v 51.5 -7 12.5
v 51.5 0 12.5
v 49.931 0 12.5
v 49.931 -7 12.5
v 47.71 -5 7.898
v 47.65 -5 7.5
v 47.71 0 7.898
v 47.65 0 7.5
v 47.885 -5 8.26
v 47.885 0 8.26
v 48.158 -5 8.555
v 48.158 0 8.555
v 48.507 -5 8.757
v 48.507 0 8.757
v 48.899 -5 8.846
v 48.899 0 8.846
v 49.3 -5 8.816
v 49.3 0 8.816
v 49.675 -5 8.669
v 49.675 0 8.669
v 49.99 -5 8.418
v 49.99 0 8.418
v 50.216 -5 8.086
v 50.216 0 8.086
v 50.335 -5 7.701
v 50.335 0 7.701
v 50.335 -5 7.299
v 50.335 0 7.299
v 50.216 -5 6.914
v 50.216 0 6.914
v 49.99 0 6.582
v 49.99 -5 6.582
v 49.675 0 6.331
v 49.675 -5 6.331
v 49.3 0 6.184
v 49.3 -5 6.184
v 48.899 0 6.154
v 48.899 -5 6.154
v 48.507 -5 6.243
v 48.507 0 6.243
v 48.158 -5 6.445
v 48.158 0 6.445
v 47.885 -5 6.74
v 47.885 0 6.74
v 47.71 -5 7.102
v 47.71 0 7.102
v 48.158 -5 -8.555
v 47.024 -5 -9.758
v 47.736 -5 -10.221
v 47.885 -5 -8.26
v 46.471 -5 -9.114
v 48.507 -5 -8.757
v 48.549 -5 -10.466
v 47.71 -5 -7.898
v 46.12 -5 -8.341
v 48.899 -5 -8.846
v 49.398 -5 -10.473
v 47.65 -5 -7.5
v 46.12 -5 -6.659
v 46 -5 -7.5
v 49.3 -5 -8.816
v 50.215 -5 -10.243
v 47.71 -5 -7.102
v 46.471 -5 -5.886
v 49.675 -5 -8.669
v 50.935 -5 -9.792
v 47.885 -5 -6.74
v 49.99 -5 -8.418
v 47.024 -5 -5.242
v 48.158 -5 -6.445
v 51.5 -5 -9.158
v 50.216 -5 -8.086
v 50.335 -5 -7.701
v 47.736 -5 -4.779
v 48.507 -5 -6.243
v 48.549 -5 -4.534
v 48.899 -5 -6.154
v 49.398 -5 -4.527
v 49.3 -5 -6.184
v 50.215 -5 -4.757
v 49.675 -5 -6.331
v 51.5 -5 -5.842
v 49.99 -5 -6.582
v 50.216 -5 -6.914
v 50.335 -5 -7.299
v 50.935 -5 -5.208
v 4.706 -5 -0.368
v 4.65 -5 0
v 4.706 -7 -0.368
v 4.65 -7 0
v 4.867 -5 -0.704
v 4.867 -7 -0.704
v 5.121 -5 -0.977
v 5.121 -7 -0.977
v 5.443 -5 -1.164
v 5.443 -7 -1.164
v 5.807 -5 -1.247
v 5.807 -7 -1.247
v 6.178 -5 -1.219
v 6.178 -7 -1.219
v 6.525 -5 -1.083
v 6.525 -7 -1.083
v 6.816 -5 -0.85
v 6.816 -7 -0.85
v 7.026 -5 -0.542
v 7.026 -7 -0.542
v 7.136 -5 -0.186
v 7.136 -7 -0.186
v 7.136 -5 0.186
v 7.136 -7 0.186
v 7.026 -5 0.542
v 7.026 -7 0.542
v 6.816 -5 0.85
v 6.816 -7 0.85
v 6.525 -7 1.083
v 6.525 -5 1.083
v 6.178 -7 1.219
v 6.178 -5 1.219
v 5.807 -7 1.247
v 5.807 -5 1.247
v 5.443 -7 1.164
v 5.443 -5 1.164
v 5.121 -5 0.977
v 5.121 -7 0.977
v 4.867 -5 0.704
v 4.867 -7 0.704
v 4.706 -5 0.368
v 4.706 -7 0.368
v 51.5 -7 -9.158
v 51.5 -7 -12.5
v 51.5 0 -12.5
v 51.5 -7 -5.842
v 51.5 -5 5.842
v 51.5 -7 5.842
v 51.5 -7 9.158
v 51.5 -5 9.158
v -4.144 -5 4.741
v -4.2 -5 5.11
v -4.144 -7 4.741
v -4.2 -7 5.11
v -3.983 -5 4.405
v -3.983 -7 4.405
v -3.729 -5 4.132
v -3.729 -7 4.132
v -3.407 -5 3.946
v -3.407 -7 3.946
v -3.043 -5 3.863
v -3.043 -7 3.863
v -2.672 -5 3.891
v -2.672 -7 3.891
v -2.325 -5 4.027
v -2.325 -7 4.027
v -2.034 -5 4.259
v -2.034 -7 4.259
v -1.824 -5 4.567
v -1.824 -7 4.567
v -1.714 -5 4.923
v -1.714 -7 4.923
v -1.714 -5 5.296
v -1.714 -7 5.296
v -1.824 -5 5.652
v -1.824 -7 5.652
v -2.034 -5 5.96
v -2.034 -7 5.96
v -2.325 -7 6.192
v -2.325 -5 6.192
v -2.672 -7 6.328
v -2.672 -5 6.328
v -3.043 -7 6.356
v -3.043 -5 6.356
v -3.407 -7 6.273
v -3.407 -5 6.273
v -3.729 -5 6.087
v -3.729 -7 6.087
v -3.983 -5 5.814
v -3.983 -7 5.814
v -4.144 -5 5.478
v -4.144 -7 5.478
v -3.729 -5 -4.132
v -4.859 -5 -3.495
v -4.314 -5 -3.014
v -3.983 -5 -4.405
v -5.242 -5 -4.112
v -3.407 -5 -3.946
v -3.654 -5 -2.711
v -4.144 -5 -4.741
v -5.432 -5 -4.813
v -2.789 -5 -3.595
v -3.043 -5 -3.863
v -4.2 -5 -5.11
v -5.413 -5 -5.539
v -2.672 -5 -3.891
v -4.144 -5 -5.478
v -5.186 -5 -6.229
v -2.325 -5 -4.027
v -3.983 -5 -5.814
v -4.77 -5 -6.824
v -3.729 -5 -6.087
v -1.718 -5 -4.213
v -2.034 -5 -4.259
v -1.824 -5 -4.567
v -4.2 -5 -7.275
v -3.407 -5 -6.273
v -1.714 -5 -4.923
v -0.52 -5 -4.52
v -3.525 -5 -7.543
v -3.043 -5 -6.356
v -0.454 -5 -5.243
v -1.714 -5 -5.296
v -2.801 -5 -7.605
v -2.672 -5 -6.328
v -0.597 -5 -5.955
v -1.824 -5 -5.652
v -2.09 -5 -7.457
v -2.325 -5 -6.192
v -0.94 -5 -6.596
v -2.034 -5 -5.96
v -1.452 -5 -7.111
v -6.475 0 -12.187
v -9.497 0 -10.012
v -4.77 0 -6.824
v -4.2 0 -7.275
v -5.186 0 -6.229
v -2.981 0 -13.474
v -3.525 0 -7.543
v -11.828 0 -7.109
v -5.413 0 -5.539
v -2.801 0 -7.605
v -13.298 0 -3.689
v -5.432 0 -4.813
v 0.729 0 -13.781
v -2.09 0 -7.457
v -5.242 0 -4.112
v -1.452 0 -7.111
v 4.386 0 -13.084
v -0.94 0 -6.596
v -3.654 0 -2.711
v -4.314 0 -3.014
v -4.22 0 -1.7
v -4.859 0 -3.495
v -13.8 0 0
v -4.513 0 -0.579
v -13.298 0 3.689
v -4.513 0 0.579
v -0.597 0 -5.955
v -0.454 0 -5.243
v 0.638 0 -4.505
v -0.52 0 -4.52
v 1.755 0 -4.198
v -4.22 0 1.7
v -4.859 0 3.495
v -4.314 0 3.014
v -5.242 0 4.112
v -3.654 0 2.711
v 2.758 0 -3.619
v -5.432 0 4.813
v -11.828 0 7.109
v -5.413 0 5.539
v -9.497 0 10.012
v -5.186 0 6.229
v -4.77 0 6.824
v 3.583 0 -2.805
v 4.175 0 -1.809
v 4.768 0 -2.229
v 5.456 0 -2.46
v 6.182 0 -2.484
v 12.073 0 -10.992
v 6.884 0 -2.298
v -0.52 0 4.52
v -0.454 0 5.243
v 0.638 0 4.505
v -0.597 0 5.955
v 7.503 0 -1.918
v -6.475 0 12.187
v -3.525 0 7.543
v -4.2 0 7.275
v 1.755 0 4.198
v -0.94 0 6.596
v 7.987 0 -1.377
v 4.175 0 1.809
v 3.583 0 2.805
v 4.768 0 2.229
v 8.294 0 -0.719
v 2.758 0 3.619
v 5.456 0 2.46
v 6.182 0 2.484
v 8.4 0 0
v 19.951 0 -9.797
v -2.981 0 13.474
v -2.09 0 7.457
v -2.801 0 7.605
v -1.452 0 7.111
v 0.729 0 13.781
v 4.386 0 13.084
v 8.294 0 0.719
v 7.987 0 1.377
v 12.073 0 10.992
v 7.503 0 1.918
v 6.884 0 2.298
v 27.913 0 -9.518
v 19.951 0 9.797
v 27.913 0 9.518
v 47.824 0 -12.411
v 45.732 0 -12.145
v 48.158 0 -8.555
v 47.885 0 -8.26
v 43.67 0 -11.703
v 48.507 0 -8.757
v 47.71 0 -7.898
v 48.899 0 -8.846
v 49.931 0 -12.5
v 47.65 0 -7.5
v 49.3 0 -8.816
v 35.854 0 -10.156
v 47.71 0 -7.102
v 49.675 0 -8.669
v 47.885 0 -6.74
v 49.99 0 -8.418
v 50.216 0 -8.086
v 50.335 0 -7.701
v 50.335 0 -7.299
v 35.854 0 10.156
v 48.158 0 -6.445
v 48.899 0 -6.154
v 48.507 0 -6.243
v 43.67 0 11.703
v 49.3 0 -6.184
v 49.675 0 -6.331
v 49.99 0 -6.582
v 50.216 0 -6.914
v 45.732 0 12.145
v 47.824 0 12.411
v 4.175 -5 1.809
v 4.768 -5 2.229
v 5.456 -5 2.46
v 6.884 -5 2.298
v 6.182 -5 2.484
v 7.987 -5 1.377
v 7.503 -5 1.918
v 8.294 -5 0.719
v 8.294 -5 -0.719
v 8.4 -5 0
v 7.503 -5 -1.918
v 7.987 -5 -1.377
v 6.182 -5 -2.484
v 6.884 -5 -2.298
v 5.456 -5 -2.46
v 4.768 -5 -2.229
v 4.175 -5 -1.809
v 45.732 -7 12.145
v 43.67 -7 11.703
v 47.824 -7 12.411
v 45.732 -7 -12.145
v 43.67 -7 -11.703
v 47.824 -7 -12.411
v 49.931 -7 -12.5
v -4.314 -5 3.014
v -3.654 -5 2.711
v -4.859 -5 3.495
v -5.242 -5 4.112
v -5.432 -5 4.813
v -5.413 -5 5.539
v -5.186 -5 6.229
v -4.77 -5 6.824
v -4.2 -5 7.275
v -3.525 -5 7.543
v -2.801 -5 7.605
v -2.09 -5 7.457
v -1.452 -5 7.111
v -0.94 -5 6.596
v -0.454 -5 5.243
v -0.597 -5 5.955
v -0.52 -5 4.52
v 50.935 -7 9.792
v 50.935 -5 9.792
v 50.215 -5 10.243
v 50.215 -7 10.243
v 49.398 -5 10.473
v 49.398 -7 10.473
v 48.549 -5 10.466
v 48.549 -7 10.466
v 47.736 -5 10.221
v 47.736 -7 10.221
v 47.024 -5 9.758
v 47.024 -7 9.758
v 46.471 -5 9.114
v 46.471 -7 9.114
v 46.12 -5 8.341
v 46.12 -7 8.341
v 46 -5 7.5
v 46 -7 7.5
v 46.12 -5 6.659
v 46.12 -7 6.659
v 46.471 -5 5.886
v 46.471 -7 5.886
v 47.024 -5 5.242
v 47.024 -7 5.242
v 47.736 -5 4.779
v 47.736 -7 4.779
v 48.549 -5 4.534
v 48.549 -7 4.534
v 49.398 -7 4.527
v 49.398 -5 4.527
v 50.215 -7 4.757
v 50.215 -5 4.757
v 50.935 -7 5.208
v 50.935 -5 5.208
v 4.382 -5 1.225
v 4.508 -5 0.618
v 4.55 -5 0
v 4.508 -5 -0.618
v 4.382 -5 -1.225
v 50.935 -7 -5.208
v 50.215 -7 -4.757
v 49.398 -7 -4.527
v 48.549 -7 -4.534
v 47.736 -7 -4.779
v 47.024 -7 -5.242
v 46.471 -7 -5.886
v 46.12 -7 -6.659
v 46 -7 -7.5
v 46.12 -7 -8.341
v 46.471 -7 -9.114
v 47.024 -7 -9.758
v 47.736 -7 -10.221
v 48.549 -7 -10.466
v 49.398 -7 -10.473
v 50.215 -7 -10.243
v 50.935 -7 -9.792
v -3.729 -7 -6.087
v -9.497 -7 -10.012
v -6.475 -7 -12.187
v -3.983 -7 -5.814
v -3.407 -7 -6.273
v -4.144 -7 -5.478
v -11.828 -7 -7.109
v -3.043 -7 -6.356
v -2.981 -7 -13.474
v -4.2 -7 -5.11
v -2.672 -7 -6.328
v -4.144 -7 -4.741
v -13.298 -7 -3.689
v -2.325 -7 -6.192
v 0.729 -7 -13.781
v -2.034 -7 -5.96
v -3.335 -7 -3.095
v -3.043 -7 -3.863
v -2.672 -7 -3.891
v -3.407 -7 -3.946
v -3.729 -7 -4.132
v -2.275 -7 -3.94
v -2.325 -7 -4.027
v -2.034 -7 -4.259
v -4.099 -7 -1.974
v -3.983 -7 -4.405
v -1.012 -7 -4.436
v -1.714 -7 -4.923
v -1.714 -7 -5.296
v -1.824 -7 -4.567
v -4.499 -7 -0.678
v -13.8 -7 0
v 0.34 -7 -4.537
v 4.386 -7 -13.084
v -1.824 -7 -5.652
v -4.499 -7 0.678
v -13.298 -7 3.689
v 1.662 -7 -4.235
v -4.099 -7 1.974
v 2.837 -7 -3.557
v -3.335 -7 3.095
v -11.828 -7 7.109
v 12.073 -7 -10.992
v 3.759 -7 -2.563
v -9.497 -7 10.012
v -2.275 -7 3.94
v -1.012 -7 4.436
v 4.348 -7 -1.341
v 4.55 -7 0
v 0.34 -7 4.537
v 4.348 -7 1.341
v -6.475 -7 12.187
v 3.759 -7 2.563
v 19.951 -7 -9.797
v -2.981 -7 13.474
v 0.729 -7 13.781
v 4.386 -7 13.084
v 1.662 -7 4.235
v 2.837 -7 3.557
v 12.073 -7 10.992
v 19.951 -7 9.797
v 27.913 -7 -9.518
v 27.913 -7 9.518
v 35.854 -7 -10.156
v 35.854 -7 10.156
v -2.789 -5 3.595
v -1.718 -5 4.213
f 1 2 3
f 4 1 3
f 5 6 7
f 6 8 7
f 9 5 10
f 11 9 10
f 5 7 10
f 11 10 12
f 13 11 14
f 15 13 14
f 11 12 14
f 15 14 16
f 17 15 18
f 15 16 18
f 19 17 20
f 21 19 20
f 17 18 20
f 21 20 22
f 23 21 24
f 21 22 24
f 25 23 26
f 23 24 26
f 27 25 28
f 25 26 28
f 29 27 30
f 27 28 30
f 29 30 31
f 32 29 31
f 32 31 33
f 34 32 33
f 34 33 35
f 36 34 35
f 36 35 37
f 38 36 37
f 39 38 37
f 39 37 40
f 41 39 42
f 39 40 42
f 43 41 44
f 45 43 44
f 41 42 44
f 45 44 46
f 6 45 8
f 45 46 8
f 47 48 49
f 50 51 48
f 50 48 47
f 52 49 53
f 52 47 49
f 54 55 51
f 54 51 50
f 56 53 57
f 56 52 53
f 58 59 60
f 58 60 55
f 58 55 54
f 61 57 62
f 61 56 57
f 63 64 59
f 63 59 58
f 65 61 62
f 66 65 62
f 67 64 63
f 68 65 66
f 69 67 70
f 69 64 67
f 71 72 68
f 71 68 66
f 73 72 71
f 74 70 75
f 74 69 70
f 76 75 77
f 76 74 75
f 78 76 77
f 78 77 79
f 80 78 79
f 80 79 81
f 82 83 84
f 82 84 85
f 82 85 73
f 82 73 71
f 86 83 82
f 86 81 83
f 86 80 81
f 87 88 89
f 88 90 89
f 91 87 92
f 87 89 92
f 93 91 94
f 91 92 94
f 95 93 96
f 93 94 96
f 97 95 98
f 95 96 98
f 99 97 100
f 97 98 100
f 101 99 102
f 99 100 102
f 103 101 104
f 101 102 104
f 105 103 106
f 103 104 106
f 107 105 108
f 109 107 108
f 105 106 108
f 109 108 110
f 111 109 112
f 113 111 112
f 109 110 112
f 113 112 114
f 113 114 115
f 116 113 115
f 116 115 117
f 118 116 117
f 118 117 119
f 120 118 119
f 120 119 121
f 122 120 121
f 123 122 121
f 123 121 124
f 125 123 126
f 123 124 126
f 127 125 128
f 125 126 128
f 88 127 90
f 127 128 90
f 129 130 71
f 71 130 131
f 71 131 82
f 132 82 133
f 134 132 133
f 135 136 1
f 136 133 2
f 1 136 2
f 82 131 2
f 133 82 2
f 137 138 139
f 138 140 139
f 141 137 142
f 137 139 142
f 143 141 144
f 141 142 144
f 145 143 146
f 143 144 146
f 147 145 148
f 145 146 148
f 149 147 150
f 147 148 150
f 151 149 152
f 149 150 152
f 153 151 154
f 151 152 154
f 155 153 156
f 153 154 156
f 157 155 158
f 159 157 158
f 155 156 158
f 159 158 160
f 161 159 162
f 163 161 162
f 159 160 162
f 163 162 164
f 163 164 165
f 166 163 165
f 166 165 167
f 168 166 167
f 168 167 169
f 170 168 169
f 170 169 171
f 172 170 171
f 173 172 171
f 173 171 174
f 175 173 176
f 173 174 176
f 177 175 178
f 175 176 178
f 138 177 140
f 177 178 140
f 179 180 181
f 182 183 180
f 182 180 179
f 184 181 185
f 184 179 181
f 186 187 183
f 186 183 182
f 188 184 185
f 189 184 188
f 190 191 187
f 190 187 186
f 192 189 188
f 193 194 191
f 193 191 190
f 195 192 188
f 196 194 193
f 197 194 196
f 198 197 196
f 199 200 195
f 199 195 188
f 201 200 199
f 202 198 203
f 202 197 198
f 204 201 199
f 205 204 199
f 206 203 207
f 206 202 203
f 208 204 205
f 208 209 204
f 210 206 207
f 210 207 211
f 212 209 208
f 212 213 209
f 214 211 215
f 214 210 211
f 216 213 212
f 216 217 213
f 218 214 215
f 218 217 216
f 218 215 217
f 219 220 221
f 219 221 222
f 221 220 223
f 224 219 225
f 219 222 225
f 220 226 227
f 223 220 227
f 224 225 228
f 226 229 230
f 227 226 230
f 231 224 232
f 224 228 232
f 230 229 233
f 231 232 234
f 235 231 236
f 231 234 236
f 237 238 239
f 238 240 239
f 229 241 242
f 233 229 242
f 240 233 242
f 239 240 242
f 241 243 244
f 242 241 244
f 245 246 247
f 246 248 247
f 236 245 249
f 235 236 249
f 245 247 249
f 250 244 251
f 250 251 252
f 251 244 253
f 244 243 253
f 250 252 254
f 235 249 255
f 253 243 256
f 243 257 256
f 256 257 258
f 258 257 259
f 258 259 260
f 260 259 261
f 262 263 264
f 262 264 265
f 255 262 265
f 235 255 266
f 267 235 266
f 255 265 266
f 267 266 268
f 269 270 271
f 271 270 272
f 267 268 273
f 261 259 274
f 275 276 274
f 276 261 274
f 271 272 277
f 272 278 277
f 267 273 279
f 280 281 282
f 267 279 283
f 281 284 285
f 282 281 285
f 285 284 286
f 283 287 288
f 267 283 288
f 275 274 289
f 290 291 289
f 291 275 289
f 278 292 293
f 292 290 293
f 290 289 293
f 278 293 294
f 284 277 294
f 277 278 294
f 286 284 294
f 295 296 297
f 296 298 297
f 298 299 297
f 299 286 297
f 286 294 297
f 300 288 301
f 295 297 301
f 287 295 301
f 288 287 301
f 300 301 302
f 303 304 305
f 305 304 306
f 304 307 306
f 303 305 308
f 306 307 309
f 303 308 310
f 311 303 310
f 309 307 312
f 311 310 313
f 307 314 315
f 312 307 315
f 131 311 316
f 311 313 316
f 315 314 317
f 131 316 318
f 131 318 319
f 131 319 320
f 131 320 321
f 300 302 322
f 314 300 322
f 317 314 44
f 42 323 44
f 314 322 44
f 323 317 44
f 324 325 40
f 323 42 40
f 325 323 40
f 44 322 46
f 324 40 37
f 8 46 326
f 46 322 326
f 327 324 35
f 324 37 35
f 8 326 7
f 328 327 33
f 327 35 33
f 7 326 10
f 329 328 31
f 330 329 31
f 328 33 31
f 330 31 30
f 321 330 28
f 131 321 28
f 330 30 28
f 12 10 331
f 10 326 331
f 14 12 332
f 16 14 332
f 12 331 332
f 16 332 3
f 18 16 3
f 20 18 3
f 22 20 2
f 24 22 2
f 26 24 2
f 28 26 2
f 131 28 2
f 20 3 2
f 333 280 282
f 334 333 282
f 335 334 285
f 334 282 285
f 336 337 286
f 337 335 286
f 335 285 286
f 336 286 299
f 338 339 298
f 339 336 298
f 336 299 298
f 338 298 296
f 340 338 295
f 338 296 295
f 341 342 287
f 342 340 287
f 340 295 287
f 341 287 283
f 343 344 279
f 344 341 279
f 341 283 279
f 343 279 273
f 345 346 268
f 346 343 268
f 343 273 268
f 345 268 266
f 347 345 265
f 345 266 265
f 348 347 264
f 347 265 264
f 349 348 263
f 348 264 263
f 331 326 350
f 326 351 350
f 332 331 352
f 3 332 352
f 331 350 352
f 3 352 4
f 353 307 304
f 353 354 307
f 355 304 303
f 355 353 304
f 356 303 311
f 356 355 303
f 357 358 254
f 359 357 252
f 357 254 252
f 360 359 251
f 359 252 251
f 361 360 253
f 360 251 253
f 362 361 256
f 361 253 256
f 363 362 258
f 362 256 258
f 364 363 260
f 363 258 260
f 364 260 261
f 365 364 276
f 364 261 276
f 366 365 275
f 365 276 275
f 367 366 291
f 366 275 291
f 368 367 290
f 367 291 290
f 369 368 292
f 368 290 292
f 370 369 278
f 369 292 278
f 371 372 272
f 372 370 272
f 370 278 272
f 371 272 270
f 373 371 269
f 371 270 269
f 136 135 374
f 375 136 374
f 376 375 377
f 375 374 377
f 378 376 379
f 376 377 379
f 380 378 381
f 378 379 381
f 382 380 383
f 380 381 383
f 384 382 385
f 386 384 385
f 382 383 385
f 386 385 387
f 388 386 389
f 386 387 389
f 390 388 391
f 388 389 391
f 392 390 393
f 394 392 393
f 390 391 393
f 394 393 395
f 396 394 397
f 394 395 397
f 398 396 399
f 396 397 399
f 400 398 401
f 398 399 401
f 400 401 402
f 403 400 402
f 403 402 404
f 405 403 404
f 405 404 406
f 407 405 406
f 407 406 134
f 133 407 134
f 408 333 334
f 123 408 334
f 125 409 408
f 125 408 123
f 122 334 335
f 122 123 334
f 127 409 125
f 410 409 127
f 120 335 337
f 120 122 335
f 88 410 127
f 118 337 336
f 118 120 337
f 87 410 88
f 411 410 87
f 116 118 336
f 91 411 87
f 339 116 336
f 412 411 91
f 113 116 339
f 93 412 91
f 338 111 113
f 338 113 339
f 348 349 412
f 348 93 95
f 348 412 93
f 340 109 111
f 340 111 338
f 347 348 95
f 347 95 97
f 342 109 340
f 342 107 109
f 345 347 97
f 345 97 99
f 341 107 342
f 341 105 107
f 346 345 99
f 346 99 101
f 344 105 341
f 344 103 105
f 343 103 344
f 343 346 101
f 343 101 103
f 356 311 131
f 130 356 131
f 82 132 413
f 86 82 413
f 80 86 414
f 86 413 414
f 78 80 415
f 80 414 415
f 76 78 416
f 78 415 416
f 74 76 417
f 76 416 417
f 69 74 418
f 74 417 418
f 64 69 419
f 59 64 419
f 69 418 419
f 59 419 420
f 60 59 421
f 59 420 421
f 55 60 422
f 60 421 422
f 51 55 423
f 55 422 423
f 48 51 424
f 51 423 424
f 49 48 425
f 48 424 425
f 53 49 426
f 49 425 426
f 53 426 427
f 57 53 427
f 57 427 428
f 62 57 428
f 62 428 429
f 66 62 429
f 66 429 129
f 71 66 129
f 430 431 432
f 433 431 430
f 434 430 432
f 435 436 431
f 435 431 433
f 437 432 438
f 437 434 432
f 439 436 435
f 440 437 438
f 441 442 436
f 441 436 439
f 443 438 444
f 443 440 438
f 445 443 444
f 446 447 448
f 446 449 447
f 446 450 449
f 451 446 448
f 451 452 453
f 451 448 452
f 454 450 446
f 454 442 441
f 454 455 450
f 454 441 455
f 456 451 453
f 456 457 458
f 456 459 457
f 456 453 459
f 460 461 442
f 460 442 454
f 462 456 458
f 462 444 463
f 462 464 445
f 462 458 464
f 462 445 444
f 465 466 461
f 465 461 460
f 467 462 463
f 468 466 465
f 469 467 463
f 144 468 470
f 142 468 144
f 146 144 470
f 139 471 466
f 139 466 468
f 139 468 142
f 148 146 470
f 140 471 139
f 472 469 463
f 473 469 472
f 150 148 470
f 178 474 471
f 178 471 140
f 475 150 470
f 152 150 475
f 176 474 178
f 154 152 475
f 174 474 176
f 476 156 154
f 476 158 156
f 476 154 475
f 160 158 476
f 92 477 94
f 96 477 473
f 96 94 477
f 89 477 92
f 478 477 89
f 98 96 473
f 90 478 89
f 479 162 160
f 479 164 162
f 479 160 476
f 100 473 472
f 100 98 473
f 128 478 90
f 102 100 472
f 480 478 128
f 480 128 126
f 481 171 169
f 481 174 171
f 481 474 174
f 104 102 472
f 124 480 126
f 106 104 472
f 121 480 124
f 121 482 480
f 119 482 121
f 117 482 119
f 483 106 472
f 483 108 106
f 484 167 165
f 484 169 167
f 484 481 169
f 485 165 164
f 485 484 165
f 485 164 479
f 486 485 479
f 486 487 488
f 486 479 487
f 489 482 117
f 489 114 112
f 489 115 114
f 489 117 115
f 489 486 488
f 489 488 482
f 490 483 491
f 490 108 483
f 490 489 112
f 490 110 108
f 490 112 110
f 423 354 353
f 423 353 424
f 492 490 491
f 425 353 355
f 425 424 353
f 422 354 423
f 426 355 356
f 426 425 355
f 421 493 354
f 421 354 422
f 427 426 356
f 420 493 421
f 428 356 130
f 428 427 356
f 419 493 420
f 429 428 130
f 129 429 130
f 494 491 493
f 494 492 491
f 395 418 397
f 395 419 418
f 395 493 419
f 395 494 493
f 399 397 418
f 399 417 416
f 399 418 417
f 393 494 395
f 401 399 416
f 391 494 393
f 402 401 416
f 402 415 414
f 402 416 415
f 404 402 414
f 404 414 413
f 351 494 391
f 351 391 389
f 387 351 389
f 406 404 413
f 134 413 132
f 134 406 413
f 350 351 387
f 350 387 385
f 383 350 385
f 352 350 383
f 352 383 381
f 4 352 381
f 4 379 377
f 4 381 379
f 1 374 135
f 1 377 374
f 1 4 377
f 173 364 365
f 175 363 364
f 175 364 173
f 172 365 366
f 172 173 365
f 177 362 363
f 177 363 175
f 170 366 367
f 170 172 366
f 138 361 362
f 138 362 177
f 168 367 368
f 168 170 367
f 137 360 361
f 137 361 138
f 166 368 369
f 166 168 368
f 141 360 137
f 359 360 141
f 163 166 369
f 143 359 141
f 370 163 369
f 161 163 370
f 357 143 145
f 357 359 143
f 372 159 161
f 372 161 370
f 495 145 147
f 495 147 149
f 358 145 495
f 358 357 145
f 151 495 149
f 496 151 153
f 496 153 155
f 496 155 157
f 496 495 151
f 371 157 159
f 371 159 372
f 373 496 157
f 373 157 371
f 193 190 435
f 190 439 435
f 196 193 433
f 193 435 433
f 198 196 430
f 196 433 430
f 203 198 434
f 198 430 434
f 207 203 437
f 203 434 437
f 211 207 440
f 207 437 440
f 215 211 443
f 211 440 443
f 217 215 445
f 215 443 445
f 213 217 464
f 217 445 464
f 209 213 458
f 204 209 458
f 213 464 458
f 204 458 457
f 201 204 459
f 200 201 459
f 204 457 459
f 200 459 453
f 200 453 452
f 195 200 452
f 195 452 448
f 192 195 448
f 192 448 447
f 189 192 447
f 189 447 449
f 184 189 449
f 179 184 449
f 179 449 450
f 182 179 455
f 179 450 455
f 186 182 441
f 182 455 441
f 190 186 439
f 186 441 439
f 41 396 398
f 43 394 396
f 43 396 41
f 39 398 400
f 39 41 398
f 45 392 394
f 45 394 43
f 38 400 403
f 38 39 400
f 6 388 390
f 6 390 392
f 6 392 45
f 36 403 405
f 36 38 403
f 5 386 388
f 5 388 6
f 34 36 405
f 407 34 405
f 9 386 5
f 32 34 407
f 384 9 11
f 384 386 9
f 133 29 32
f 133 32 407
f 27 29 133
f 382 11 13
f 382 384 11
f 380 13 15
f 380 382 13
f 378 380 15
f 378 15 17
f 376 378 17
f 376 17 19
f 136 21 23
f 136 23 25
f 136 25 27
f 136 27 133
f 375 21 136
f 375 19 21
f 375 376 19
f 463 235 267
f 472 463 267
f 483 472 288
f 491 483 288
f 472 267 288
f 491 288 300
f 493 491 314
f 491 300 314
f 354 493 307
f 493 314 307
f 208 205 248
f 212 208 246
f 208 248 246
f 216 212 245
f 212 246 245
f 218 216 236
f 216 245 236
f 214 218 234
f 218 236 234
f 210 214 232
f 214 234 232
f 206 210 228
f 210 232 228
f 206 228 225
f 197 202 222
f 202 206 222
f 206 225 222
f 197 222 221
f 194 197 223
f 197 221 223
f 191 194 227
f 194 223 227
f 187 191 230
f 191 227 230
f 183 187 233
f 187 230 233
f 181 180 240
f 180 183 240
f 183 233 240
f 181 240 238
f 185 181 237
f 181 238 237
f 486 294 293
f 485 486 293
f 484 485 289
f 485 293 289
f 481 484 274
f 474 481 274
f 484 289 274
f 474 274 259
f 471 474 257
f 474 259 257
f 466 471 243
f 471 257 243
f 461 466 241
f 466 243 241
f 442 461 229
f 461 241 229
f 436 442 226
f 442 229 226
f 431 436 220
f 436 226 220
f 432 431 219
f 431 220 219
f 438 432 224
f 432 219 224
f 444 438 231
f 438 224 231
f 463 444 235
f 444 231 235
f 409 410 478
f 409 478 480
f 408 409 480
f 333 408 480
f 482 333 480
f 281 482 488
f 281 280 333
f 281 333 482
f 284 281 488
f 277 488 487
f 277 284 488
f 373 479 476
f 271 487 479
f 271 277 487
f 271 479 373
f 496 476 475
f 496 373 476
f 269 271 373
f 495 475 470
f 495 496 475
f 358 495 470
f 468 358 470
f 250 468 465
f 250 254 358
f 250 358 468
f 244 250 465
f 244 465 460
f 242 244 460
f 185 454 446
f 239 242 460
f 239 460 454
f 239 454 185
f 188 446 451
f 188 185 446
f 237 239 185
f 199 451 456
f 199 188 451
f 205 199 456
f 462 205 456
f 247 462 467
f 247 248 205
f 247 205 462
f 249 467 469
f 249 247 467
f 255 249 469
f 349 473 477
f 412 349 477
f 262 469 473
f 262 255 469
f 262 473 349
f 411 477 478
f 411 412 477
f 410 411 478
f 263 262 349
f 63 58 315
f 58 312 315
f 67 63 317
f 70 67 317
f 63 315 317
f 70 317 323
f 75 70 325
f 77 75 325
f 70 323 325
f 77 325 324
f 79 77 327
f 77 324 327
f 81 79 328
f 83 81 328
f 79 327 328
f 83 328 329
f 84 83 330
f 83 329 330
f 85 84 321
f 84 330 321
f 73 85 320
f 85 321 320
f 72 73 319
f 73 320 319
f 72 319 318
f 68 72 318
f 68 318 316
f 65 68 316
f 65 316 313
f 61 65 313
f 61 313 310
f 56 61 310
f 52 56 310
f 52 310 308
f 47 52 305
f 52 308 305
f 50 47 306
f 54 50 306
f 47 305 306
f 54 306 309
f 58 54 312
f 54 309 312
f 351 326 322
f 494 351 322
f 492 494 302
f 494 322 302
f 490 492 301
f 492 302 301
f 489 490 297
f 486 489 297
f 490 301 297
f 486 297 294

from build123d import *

# Parameters (mm, degrees)
F0_R           = 4.55
F1_DEPTH       = 7
F3_D           = 2.5
F3_CBORE_D     = 5
F3_CBORE_DEPTH = 5
F4_D           = 2.7
F4_CBORE_D     = 6
F4_CBORE_DEPTH = 2
F5_R           = 25


with BuildPart() as f1:
    # F0 (on Front) → F1 (new body)
    with BuildSketch(Plane.XZ):
        with BuildLine():
            ThreePointArc((4.3861063064, -13.0844209451), (11.2019700729, -8.0595202392), (13.8, 0))
            ThreePointArc((13.8, 0), (11.2019700729, 8.0595202392), (4.3861063064, 13.0844209451))
            ThreePointArc((4.3861063064, 13.0844209451), (-13.8, 0), (4.3861063064, -13.0844209451))
        make_face()
        Circle(F0_R, mode=Mode.SUBTRACT)
        with BuildLine():
            ThreePointArc((4.3861063064, 13.0844209451), (11.2019700729, 8.0595202392), (13.8, 0))
            ThreePointArc((13.8, 0), (11.2019700729, -8.0595202392), (4.3861063064, -13.0844209451))
            ThreePointArc((4.3861063064, -13.0844209451), (25.3974589974, -9.5066550069), (46.5, -12.5))
            Line((46.5, -12.5), (51.5, -12.5))
            Line((51.5, -12.5), (51.5, 12.5))
            Line((51.5, 12.5), (46.5, 12.5))
            ThreePointArc((46.5, 12.5), (25.3974589974, 9.5066550069), (4.3861063064, 13.0844209451))
        make_face()
    extrude(amount=F1_DEPTH)

    # F3 (through all)
    with Locations(Plane(origin=(0, 0, 0), x_dir=(1, 0, 0), z_dir=(0, 1, 0))):
        with Locations((-2.95, -5.1095498823), (-2.95, 5.1095498823), (5.9, 0)):
            CounterBoreHole(F3_D / 2, F3_CBORE_D / 2, F3_CBORE_DEPTH)

    # F4 (through all)
    with Locations(Plane.XZ.offset(7)):
        with Locations((49, 7.5), (49, -7.5)):
            CounterBoreHole(F4_D / 2, F4_CBORE_D / 2, F4_CBORE_DEPTH)

    # F5
    f5_edges = [f1.edges().sort_by_distance(p)[0] for p in [
        (46.5, -3.5, 12.5),
        (46.5, -3.5, -12.5),
    ]]
    fillet(f5_edges, radius=F5_R)


solid = f1.part
